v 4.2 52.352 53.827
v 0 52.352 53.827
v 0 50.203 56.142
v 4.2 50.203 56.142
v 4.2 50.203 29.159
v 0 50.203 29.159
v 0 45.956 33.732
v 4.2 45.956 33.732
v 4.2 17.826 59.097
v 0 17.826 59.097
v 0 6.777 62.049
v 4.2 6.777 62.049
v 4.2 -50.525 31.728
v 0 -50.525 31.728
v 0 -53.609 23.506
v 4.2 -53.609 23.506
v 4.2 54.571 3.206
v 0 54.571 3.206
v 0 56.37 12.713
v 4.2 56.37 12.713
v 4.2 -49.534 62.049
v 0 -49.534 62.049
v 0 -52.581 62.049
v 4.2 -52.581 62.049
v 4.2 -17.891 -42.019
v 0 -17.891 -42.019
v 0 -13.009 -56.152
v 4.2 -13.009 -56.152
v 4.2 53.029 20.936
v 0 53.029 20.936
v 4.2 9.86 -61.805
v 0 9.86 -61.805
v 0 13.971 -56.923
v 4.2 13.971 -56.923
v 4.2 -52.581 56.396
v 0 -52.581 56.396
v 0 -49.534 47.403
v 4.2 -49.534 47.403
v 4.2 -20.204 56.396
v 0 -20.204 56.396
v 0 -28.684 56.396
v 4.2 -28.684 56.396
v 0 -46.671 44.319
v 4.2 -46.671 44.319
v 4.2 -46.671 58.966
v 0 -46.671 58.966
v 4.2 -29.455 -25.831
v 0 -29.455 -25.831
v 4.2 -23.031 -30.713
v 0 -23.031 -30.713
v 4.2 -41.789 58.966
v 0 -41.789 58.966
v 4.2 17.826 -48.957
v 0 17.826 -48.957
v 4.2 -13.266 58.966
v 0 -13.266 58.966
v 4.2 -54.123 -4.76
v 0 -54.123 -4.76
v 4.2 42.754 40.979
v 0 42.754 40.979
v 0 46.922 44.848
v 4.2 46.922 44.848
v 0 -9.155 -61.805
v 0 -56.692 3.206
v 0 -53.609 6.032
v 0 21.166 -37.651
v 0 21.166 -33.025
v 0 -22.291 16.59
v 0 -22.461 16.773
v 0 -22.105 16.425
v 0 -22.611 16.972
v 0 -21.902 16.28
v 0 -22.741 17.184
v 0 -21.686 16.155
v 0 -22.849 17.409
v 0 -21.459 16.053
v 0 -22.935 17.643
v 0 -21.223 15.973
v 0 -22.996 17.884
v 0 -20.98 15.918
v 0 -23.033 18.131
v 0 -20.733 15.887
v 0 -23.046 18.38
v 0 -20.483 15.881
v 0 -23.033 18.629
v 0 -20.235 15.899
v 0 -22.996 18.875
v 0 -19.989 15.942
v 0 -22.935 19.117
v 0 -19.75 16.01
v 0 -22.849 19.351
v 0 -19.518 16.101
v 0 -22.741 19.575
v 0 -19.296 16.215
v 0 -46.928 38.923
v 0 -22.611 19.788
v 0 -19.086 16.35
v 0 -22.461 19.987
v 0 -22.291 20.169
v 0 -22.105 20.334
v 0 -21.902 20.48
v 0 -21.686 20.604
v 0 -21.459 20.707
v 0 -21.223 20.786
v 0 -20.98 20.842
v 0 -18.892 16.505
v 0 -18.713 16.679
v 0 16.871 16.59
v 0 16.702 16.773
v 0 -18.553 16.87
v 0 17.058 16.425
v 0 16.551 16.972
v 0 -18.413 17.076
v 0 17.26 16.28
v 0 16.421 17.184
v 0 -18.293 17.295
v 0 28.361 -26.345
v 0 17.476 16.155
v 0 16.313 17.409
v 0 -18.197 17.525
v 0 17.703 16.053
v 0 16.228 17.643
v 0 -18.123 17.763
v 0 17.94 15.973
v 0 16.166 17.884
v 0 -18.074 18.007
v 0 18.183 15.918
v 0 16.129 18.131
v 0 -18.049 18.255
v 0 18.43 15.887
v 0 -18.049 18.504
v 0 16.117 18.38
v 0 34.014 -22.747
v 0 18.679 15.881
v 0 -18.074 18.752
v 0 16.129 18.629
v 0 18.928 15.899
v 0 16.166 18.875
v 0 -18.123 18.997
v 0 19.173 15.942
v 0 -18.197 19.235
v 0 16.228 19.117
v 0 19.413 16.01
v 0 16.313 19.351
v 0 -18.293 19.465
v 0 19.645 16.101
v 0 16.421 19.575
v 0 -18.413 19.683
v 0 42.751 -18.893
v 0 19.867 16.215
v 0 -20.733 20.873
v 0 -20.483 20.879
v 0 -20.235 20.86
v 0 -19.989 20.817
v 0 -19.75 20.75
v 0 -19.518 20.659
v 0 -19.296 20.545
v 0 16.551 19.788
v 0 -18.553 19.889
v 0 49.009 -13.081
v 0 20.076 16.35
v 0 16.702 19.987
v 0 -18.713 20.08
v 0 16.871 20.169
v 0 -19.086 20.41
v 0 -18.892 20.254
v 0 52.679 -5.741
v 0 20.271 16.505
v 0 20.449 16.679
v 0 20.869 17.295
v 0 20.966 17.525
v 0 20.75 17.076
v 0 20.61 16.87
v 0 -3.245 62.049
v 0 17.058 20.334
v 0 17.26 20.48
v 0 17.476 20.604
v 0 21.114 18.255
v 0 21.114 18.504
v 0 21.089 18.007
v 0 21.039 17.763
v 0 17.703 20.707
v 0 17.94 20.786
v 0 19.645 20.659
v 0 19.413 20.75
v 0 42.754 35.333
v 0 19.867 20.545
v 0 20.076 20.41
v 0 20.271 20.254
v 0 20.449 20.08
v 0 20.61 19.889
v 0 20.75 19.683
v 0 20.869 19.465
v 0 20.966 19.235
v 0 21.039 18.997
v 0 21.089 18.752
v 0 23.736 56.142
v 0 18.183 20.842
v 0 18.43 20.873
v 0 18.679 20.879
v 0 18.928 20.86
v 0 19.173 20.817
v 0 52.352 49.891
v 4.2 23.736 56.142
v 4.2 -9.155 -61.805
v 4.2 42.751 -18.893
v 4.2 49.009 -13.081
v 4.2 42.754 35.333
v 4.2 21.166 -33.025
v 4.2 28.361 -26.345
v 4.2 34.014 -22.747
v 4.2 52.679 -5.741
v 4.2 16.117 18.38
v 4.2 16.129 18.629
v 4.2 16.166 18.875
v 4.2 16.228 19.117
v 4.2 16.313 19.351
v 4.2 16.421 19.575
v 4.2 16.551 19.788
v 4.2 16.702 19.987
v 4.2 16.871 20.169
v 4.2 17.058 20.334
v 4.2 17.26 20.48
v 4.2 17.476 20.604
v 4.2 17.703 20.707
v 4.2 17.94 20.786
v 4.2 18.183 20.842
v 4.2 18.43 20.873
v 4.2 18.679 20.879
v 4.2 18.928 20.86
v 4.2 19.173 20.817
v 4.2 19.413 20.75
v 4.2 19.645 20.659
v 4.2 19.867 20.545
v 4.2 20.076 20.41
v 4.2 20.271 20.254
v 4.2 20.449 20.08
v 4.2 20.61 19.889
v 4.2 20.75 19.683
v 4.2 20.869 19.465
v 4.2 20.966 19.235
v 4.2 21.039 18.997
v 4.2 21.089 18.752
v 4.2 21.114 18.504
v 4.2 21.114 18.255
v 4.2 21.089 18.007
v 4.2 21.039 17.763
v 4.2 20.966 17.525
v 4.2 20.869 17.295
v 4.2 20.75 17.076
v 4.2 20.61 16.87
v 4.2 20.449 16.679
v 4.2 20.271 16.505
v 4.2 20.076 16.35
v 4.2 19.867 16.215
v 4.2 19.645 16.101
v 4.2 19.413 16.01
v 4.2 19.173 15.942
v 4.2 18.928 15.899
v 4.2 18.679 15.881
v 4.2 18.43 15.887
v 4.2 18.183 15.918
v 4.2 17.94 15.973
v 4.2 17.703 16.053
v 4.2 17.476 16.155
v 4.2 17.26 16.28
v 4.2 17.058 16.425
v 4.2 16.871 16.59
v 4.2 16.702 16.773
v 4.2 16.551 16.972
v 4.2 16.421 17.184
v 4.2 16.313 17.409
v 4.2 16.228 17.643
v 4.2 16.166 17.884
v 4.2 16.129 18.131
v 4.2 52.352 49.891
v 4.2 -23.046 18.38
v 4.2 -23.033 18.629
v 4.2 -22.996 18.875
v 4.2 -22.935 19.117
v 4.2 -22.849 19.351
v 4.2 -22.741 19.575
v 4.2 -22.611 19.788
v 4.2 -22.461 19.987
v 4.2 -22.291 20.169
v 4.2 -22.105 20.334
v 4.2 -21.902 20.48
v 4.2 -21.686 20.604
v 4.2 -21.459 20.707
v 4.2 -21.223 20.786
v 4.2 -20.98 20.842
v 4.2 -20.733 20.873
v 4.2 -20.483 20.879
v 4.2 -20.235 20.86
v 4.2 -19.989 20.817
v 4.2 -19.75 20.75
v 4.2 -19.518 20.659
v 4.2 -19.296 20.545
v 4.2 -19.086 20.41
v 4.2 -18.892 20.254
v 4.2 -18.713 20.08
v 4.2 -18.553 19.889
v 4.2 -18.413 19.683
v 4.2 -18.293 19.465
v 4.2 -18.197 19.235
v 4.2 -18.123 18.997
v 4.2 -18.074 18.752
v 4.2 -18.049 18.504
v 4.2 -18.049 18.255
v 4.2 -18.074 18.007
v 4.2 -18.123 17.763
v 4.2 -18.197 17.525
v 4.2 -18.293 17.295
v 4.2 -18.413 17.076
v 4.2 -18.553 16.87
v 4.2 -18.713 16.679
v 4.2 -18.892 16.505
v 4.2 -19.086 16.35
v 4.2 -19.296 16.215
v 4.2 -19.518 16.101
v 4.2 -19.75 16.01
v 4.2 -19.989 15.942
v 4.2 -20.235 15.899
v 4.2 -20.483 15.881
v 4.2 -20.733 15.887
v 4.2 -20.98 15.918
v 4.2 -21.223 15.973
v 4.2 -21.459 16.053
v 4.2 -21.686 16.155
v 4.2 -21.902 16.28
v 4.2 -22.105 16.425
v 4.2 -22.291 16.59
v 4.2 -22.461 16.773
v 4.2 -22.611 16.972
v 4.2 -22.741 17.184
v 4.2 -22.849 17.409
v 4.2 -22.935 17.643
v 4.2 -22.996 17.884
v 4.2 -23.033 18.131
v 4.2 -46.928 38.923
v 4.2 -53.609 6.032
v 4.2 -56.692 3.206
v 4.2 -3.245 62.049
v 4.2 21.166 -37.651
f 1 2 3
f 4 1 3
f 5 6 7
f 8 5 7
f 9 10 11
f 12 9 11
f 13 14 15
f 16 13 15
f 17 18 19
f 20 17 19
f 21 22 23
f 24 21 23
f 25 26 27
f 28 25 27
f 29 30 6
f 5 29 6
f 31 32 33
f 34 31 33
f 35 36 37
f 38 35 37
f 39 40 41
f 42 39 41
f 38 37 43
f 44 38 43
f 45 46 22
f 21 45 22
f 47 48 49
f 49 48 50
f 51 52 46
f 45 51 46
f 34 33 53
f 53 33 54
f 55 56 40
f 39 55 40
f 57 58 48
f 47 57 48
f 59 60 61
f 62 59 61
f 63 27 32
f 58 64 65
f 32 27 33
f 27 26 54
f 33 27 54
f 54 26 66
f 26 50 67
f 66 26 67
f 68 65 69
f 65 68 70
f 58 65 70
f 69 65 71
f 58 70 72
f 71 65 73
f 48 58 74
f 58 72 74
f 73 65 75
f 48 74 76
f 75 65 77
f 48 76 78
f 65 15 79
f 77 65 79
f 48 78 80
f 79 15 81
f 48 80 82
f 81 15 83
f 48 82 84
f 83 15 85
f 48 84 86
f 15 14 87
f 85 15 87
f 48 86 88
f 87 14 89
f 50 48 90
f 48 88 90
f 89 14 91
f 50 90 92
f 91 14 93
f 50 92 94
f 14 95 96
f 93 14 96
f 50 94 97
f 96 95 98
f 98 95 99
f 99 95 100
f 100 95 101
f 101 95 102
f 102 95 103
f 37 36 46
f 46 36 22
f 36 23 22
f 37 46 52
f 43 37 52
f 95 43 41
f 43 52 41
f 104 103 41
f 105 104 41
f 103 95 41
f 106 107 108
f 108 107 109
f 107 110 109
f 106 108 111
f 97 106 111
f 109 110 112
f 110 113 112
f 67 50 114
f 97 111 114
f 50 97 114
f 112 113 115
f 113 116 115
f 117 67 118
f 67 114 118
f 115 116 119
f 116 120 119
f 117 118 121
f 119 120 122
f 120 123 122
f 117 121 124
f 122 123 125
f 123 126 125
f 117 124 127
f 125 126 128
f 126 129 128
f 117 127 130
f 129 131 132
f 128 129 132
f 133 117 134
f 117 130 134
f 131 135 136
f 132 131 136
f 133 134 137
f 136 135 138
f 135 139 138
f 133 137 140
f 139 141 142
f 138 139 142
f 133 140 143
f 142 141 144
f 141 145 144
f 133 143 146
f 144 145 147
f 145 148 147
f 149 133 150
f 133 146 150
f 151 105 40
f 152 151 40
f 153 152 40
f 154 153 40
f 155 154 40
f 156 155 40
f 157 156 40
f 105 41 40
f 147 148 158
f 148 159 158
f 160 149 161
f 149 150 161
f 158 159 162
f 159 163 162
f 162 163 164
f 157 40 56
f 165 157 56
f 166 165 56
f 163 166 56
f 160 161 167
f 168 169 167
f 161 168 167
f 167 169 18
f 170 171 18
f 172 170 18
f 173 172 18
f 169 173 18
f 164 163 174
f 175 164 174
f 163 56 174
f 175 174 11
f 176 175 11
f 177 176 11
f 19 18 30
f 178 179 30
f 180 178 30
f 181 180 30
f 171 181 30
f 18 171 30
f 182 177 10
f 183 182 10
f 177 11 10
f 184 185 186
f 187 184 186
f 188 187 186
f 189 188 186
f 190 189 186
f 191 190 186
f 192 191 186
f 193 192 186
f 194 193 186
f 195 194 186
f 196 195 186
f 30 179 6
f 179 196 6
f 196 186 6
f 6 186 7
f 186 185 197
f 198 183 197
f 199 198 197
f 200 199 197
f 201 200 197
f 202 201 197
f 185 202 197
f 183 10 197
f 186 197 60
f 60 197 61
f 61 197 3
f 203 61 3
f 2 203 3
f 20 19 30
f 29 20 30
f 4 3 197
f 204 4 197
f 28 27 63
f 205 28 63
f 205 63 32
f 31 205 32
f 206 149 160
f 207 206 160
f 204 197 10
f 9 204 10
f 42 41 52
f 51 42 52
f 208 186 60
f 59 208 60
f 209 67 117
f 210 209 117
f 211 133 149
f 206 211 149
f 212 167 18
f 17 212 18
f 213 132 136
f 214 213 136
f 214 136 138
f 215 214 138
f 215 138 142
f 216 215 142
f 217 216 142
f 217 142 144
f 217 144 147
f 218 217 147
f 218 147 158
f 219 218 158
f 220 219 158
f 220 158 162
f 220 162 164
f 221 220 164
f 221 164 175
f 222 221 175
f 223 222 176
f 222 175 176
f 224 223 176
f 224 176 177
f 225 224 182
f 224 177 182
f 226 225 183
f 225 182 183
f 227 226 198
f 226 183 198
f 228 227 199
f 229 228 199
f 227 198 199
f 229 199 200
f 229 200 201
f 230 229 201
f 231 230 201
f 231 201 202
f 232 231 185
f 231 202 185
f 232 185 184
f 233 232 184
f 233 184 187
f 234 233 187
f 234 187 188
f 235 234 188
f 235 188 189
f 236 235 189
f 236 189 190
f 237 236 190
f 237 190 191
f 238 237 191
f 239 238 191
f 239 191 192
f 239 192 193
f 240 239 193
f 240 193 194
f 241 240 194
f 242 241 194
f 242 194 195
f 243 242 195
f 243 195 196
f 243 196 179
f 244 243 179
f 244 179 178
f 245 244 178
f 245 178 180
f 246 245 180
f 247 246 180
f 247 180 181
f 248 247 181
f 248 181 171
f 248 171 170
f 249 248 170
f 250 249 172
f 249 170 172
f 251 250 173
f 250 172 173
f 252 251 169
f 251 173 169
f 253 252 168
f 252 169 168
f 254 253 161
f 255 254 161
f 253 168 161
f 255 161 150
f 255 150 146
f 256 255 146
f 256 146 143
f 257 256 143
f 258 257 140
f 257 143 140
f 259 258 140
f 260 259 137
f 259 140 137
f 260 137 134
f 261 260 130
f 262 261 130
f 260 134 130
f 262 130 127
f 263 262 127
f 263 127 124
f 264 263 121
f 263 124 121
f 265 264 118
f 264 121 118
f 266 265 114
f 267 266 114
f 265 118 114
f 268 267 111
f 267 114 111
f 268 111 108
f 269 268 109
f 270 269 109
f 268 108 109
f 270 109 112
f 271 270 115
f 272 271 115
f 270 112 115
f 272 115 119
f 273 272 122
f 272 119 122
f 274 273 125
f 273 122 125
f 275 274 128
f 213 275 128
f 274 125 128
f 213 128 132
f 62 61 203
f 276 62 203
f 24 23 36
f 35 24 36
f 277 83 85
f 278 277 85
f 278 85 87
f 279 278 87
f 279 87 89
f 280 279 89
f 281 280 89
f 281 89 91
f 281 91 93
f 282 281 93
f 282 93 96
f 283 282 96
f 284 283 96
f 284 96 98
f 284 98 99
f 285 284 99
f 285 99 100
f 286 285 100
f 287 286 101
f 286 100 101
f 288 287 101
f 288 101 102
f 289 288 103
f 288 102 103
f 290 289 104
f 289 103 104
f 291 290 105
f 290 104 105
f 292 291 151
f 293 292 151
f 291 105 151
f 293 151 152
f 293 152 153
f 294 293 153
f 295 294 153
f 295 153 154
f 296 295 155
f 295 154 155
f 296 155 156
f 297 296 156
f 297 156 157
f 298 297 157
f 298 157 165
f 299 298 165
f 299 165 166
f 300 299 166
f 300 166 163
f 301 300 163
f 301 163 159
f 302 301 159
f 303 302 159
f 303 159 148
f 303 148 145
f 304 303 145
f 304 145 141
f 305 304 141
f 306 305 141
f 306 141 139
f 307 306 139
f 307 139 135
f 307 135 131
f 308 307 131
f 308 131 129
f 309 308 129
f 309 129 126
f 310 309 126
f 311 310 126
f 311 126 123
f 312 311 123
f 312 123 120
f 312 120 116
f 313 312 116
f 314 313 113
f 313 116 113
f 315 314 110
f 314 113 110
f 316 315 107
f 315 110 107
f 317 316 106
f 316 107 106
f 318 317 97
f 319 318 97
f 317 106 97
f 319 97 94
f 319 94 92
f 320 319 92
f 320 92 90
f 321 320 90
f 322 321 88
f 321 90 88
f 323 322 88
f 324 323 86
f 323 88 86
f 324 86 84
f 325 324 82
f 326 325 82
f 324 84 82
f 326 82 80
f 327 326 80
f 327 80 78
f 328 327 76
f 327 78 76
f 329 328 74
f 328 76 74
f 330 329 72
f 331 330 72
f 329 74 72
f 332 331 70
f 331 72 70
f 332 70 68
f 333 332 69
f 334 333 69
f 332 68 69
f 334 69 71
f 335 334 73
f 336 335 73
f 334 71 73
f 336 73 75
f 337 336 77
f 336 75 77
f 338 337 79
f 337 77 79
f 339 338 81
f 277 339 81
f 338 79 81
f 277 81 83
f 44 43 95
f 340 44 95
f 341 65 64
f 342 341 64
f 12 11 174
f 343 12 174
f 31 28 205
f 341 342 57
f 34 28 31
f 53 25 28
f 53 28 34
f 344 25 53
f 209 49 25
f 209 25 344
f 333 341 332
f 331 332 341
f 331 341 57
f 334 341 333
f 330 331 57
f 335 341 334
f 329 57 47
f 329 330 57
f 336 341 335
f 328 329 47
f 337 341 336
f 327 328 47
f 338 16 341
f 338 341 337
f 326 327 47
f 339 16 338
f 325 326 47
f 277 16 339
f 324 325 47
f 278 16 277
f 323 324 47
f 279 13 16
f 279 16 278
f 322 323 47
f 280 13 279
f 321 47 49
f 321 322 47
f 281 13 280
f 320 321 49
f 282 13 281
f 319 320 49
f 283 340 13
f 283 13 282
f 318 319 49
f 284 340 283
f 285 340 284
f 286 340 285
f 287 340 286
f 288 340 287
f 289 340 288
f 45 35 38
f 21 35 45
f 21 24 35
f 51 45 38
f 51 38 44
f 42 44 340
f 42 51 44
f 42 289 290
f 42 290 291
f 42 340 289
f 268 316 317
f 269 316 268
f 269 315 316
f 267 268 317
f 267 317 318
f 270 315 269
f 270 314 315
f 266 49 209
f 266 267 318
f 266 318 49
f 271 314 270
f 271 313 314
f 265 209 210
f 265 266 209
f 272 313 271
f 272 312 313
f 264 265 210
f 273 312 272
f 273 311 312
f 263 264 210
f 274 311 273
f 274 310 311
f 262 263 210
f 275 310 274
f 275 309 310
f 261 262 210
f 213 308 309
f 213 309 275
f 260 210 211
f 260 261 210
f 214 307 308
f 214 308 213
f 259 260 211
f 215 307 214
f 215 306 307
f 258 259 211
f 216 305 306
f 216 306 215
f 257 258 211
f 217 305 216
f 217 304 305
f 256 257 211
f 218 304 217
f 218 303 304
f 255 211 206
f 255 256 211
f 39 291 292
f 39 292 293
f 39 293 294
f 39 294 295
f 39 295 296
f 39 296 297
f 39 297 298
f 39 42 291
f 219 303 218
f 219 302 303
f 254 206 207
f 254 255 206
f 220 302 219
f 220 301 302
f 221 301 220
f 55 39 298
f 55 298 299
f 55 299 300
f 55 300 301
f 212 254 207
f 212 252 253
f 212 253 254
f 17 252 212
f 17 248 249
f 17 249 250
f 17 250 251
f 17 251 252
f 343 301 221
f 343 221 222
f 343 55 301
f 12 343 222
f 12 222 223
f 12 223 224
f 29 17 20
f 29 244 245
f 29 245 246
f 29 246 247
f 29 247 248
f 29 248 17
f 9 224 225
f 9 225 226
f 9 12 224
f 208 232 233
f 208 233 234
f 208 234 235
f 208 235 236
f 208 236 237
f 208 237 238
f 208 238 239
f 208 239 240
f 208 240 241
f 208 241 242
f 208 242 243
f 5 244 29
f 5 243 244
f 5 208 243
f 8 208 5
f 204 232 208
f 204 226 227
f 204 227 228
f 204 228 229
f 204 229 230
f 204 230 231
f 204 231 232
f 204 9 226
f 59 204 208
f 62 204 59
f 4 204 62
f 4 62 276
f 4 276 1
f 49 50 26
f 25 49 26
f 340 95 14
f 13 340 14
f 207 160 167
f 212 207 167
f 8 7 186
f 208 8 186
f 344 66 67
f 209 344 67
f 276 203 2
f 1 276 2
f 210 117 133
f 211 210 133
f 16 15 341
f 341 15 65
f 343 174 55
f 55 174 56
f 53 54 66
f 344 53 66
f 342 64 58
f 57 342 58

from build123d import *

# Parameters (mm, degrees)
F1_DEPTH = 4.2
F3_D     = 5
F3_DEPTH = 12


with BuildPart() as f1:
    # F0 (on Right) → F1 (new body)
    with BuildSketch(Plane.YZ):
        Polygon((-46.670854, 44.319186), (-46.927813, 38.92304), (-50.525237, 31.728189), (-53.608745, 23.505505), (-53.608745, 17.595448), (-53.608745, 10.657554), (-53.608745, 6.032293), (-56.692254, 3.205744), (-54.122664, -4.759984), (-29.454602, -25.830621), (-23.030626, -30.712841), (-17.891448, -42.019036), (-13.009225, -56.151781), (-9.154841, -61.804876), (-3.244784, -61.804876), (3.693108, -61.804876), (9.860124, -61.804876), (13.97147, -56.922659), (17.825851, -48.956931), (21.166321, -37.650734), (21.166321, -33.025473), (28.361171, -26.344538), (34.01427, -22.747112), (42.750873, -18.892728), (49.009407, -13.081229), (52.679341, -5.741356), (54.570988, 3.205744), (56.369703, 12.713227), (53.029235, 20.935914), (50.202683, 29.158602), (45.956173, 33.731764), (42.754392, 35.332654), (42.754392, 38.409129), (42.754392, 40.978711), (46.921574, 44.84824), (52.35221, 49.890975), (52.35221, 53.826664), (50.202683, 56.141538), (42.754392, 56.141538), (32.215554, 56.141538), (23.735909, 56.141538), (17.825851, 59.096566), (6.776613, 62.049348), (3.693108, 62.049348), (-3.244784, 62.049348), (-13.266183, 58.965843), (-20.204078, 56.396253), (-28.683724, 56.396253), (-41.78863, 58.965843), (-46.670854, 58.965843), (-49.53411, 62.049348), (-52.580908, 62.049348), (-52.580908, 56.396253), (-49.53411, 47.402691), align=None)
    extrude(amount=F1_DEPTH)

    # F3
    with Locations(Plane.YZ.offset(4.2)):
        with Locations((-20.545784, 18.379813), (18.616695, 18.379813)):
            Hole(F3_D / 2, depth=F3_DEPTH)


solid = f1.part
